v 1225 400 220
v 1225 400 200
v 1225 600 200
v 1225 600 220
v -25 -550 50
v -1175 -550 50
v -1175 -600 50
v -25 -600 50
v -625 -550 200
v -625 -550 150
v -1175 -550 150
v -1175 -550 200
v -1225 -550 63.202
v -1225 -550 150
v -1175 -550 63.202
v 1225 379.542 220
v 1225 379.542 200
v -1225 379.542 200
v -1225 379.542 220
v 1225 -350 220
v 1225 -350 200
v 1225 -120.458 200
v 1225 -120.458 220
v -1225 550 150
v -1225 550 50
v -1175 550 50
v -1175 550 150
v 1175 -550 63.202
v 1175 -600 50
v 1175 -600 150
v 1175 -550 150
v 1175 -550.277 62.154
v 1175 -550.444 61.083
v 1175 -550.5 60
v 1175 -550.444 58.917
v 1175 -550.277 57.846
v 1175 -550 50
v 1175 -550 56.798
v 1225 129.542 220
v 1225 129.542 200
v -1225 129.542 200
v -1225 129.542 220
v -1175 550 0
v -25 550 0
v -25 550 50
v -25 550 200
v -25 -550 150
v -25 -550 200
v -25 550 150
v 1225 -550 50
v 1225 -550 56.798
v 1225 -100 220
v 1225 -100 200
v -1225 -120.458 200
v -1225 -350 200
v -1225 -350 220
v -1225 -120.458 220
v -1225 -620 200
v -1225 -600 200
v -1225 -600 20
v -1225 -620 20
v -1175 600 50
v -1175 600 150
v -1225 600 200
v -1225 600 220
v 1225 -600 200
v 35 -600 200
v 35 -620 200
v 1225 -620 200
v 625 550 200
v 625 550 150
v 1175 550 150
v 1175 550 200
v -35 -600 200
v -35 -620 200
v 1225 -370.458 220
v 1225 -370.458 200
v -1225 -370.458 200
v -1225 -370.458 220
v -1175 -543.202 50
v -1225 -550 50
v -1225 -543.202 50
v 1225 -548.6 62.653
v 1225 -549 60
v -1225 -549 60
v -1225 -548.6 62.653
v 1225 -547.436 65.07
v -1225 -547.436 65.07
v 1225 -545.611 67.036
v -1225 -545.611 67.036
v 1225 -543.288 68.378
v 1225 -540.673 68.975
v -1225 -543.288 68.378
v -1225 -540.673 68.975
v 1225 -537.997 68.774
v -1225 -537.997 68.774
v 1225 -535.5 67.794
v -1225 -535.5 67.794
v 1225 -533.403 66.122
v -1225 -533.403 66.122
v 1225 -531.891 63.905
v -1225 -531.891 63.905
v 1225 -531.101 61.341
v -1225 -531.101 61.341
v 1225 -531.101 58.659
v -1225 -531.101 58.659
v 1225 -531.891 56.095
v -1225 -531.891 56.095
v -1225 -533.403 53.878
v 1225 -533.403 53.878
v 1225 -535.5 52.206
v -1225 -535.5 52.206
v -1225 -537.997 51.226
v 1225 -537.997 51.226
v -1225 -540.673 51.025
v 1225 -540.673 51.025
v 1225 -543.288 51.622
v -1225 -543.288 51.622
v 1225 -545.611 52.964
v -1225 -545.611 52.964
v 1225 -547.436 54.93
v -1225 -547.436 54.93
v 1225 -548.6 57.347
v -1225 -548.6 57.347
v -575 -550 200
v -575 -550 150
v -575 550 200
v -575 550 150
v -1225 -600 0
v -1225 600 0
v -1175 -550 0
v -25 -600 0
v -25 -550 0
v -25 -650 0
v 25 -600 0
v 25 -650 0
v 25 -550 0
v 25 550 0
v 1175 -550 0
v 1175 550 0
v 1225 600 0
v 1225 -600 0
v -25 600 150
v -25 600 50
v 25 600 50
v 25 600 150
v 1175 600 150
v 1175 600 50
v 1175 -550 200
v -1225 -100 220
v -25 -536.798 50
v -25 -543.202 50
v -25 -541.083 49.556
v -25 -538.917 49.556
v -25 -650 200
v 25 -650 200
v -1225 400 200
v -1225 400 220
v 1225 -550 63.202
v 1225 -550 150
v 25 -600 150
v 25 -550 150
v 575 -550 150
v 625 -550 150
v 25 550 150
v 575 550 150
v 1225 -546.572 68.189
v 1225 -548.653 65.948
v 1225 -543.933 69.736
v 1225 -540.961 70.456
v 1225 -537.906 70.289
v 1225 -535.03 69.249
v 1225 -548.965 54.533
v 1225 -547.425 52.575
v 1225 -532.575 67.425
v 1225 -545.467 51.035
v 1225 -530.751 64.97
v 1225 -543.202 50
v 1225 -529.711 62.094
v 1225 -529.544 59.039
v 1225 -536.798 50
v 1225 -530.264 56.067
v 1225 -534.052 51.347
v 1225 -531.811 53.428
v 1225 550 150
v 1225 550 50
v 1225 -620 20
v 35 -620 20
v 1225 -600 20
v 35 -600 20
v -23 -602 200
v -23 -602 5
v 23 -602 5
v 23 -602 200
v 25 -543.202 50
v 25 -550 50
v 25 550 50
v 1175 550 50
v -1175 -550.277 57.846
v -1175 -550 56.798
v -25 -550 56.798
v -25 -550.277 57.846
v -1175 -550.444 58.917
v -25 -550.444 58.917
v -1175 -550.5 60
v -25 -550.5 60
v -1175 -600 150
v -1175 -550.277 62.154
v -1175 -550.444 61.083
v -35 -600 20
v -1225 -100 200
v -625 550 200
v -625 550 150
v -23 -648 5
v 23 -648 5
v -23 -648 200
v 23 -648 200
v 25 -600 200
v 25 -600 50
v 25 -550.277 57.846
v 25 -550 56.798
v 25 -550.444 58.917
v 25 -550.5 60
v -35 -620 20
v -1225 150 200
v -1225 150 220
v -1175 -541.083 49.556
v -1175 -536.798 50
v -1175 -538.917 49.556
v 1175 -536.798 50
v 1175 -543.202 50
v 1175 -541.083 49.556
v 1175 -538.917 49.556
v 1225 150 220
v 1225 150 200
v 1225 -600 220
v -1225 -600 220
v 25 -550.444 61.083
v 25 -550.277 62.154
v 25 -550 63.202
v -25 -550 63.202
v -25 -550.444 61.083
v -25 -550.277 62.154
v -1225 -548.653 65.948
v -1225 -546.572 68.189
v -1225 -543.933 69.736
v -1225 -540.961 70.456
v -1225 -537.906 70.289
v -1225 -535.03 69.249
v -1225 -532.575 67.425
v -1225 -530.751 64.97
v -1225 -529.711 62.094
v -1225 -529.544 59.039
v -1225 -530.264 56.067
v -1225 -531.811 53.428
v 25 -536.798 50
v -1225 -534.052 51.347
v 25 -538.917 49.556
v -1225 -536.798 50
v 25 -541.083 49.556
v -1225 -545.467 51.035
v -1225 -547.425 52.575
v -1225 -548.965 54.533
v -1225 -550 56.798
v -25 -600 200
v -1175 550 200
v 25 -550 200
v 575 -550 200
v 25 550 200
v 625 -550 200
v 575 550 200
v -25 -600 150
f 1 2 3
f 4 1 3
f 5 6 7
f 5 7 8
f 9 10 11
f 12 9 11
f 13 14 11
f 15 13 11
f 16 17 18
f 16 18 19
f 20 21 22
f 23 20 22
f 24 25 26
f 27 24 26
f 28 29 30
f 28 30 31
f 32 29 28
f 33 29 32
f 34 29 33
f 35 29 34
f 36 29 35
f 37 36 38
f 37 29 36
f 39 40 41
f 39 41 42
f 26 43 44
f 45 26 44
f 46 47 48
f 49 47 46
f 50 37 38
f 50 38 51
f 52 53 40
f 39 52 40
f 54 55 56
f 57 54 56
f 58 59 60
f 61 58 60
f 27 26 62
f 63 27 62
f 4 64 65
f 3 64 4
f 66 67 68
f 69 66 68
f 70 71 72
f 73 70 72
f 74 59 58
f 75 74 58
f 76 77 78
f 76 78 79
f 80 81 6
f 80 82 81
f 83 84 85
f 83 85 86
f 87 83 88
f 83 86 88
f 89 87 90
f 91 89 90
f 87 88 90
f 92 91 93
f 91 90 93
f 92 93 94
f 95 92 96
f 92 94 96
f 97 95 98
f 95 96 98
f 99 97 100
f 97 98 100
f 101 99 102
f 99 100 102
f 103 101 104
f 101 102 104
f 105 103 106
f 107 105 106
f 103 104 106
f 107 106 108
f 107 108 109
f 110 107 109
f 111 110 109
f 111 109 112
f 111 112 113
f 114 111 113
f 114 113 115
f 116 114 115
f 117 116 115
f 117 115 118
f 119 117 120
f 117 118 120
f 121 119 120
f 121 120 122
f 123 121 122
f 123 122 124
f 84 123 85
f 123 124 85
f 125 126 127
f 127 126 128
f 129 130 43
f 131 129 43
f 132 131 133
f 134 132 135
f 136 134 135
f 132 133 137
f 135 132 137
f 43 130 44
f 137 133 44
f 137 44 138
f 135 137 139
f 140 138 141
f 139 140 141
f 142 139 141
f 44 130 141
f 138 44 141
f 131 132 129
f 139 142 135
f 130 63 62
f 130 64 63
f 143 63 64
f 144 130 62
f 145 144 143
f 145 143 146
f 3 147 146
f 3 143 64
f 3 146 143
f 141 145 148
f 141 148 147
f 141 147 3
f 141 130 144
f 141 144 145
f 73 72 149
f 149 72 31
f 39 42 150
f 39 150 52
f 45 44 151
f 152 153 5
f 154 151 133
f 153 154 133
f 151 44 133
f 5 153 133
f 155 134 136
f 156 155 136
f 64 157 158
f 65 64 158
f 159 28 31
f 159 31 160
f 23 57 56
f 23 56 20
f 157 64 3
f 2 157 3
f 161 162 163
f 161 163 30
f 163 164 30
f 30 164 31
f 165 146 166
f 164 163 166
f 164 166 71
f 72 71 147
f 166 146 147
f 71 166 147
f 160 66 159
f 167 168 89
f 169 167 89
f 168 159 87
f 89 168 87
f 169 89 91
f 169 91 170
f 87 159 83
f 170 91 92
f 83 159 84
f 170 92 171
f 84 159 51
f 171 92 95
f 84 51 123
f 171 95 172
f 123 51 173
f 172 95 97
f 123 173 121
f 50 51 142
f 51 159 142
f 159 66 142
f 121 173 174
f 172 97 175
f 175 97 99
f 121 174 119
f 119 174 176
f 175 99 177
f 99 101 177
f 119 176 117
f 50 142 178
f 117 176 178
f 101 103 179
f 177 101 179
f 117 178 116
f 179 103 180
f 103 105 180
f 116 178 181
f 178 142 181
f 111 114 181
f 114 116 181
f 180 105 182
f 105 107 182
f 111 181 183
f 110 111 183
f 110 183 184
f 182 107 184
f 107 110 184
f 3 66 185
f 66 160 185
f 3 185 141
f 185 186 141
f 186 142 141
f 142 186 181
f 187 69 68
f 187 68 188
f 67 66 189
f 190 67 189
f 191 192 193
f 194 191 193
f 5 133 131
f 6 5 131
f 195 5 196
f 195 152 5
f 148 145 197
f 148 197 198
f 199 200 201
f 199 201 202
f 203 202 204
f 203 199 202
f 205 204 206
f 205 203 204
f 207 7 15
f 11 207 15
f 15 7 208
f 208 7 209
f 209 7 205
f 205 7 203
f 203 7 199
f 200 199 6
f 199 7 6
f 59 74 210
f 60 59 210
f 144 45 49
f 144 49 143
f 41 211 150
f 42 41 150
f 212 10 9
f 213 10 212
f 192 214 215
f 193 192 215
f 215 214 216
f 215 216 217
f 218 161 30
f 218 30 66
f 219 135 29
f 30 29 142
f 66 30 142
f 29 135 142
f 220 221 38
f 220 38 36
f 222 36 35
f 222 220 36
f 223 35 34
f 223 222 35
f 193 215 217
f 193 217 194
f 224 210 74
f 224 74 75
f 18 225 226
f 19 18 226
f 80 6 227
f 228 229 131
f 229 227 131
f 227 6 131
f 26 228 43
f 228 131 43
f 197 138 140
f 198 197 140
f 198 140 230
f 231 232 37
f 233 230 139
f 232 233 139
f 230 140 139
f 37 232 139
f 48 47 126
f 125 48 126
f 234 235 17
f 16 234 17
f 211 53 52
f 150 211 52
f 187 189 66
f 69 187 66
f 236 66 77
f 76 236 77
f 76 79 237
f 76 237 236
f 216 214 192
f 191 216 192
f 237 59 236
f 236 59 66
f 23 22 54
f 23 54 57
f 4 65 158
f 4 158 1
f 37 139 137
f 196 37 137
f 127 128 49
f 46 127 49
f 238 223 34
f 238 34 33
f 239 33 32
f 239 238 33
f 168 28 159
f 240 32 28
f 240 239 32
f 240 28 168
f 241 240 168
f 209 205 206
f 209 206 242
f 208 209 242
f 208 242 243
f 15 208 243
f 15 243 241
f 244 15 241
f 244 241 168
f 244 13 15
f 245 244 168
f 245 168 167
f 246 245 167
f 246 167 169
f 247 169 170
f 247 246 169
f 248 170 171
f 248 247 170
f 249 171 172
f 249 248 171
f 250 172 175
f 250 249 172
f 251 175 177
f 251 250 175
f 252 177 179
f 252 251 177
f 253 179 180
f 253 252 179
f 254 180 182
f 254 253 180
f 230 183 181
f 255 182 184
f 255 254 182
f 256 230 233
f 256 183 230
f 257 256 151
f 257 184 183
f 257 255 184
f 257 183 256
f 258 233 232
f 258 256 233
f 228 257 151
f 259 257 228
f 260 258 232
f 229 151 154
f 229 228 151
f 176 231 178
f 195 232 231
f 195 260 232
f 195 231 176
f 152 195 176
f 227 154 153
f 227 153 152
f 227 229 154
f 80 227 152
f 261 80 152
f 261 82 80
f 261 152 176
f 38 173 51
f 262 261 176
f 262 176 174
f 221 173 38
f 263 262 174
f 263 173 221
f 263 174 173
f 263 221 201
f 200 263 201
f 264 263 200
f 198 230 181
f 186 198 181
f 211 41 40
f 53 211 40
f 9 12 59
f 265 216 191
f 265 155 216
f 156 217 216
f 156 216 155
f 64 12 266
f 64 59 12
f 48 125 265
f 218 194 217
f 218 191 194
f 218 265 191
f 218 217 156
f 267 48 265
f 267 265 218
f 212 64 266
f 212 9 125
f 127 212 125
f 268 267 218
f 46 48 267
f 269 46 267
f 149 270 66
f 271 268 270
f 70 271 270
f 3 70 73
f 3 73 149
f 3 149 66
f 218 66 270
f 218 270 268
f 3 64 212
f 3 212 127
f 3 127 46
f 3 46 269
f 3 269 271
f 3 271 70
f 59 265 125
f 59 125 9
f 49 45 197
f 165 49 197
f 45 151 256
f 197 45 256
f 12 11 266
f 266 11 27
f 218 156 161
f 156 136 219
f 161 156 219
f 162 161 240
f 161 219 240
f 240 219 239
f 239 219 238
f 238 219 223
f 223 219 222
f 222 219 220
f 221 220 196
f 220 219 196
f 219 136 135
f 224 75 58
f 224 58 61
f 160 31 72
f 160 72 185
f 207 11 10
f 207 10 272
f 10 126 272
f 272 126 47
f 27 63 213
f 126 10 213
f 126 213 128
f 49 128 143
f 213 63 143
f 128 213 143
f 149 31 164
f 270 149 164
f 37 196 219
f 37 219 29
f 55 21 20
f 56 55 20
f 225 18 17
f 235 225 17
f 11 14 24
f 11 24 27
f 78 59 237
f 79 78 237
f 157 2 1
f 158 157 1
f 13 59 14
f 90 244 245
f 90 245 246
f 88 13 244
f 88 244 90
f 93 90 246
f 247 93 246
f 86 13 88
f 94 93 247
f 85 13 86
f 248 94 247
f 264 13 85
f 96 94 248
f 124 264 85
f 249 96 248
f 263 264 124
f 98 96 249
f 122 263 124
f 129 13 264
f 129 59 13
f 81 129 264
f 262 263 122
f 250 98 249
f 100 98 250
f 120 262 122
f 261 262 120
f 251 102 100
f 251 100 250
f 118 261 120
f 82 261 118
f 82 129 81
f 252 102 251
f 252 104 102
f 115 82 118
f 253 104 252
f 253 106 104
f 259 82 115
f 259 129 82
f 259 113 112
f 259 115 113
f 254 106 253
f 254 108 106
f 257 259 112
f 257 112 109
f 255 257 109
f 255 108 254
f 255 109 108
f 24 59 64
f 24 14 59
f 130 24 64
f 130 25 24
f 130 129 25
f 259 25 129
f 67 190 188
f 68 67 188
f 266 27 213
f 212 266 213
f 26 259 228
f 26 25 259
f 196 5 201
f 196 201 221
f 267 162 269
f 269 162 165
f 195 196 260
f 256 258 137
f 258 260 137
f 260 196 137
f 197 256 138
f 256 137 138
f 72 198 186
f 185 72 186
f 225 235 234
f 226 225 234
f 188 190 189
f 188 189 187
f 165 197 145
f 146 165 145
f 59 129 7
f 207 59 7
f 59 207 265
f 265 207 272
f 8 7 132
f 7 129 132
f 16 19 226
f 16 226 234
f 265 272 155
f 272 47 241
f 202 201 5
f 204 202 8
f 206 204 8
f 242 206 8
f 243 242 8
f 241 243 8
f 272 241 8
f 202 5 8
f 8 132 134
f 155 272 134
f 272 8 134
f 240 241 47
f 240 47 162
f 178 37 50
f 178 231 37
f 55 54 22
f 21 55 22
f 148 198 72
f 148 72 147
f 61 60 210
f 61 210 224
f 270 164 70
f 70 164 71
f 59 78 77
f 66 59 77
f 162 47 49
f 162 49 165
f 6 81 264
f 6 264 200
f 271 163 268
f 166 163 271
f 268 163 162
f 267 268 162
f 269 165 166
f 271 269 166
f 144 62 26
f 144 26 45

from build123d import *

# Parameters (mm, degrees)
F0_W      = 50
F0_H      = 50
F0_H_2    = 1100
F1_DEPTH  = 50
F2_W      = 50
F2_H      = 50
F3_DEPTH  = 100
F4_W      = 2450
F4_H      = 1200
F4_W_2    = 25
F4_H_2    = 1100
F4_W_3    = 50
F5_DEPTH  = 50
F6_R      = 9
F7_DEPTH  = 2450
F9_DEPTH  = 20
F10_W     = 2500
F10_H     = 1200
F11_DEPTH = 20
F12_DEPTH = 110
F13_W     = 20.458304882
F13_H     = 20
F14_DEPTH = 2500
F15_DEPTH = 60
F17_W     = 50
F17_H     = 20
F18_DEPTH = 1200.001
F19_W     = 50
F19_H     = 50
F19_W_2   = 10
F20_DEPTH = 200
F21_W     = 50
F21_H     = 50
F22_DEPTH = 5
F23_W     = 46
F23_H     = 46
F23_W_2   = 2
F23_H_2   = 2
F24_DEPTH = 195


with BuildPart() as f1:
    # F0 (on Top) → F1 (new body)
    with BuildSketch(Plane.XY):
        with Locations((1200, -575)):
            Rectangle(F0_W, F0_H)
        Polygon((-1175, -600), (1175, -600), (1175, -550), (25, -550), (0, -550), (-25, -550), (-1175, -550), align=None)
        with Locations((1200, 0)):
            Rectangle(F0_W, F0_H_2)
        with Locations((-1200, -575)):
            Rectangle(F0_W, F0_H)
        with Locations((1200, 575)):
            Rectangle(F0_W, F0_H)
        with Locations((-1200, 0)):
            Rectangle(F0_W, F0_H_2)
        Polygon((25, 550), (1175, 550), (1175, 600), (-1175, 600), (-1175, 550), (-25, 550), (0, 550), align=None)
        with Locations((-1200, 575)):
            Rectangle(F0_W, F0_H)
        Polygon((0, -550), (25, -550), (25, 0), (25, 550), (0, 550), (0, 0), align=None)
        Polygon((-25, 0), (-25, -550), (0, -550), (0, 0), (0, 550), (-25, 550), align=None)
    extrude(amount=F1_DEPTH)

    # F2 (on face) → F3 (join)
    with BuildSketch(Plane.XY.offset(50)):
        with Locations((0, 575)):
            Rectangle(F2_W, F2_H)
        with Locations((-1200, 575)):
            Rectangle(F2_W, F2_H)
        with Locations((-1200, -575)):
            Rectangle(F2_W, F2_H)
        with Locations((0, -575)):
            Rectangle(F2_W, F2_H)
        with Locations((1200, -575)):
            Rectangle(F2_W, F2_H)
        with Locations((1200, 575)):
            Rectangle(F2_W, F2_H)
    extrude(amount=F3_DEPTH)

    # F4 (on face) → F5 (join)
    with BuildSketch(Plane.XY.offset(150)):
        Rectangle(F4_W, F4_H)
        Polygon((1175, 550), (1175, -550), (625, -550), (600, -550), (575, -550), (25, -550), (-25, -550), (-575, -550), (-600, -550), (-625, -550), (-1175, -550), (-1175, 550), (-625, 550), (-600, 550), (-575, 550), (-25, 550), (25, 550), (575, 550), (600, 550), (625, 550), align=None, mode=Mode.SUBTRACT)
        with Locations((-587.5, 0)):
            Rectangle(F4_W_2, F4_H_2)
        with Locations((-612.5, 0)):
            Rectangle(F4_W_2, F4_H_2)
        with Locations((612.5, 0)):
            Rectangle(F4_W_2, F4_H_2)
        with Locations((587.5, 0)):
            Rectangle(F4_W_2, F4_H_2)
        Rectangle(F4_W_3, F4_H_2)
    extrude(amount=F5_DEPTH)

    # F6 (on face) → F7 (join)
    with BuildSketch(Plane(origin=(-1225, 0, 0), x_dir=(0, -1, 0), z_dir=(-1, 0, 0))):
        with BuildLine():
            ThreePointArc((550.5, 60), (529.6257530394, 61.6201851746), (550, 56.7984378813))
            ThreePointArc((550, 56.7984378813), (550.3742469606, 58.3798148254), (550.5, 60))
        make_face()
        with Locations((540, 60)):
            Circle(F6_R, mode=Mode.SUBTRACT)
    extrude(amount=-F7_DEPTH)

    # F21 (on face) → F22 (join)
    with BuildSketch(Plane(origin=(0, 0, 0), x_dir=(1, 0, 0), z_dir=(0, 0, -1))):
        with Locations((0, 625)):
            Rectangle(F21_W, F21_H)
    extrude(amount=-F22_DEPTH)

    # F23 (on face) → F24 (join, through all)
    with BuildSketch(Plane.XY.offset(5)):
        Polygon((25, -600), (-25, -600), (-25, -650), (23, -650), (23, -648), (25, -648), align=None)
        with Locations((0, -625)):
            Rectangle(F23_W, F23_H, mode=Mode.SUBTRACT)
        with Locations((24, -649)):
            Rectangle(F23_W_2, F23_H_2)
    extrude(amount=F24_DEPTH)


with BuildPart() as f9:
    # F8 (on face) → F9 (new body)
    with BuildSketch(Plane.XZ.offset(600)):
        Polygon((1225, 20), (1225, 200), (-1225, 200), (-1275, 200), (-1275, 20), align=None)
    extrude(amount=F9_DEPTH)

    # F12 (cut): a face of the model
    f12_faces = [f9.faces().sort_by_distance(p)[0] for p in [
        (-1275, -610, 110),
    ]]
    extrude(f12_faces, amount=-F12_DEPTH, mode=Mode.SUBTRACT)


with BuildPart() as f11:
    # F10 (on face) → F11 (new body)
    with BuildSketch(Plane.XY.offset(200)):
        with Locations((-25, 0)):
            Rectangle(F10_W, F10_H)
    extrude(amount=F11_DEPTH)

    # F13 (on face) → F14 (cut, through all)
    with BuildSketch(Plane(origin=(-1275, 0, 0), x_dir=(0, -1, 0), z_dir=(-1, 0, 0))):
        with Locations((610.229152441, 210)):
            Rectangle(F13_W, F13_H)
        with Locations((360.229152441, 210)):
            Rectangle(F13_W, F13_H)
        with Locations((110.229152441, 210)):
            Rectangle(F13_W, F13_H)
        with Locations((-139.770847559, 210)):
            Rectangle(F13_W, F13_H)
        with Locations((-389.770847559, 210)):
            Rectangle(F13_W, F13_H)
    extrude(amount=-F14_DEPTH, mode=Mode.SUBTRACT)

    # F17 (on face) → F18 (cut, through all)
    with BuildSketch(Plane.XZ.offset(600)):
        with Locations((-1250, 210)):
            Rectangle(F17_W, F17_H)
    extrude(amount=-F18_DEPTH, mode=Mode.SUBTRACT)


with BuildPart() as f15:
    # F15 (new, through all): a face of the model
    f15_faces = [f9.part.faces().sort_by_distance(p)[0] for p in [
        (-1165, -610, 110),
    ]]
    extrude(f15_faces, amount=F15_DEPTH)


with BuildPart() as f9_1:
    add(f9.part)

    # F16: union F15
    add(f15.part)

    # F19 (on face) → F20 (cut, through all)
    with BuildSketch(Plane(origin=(0, 0, 0), x_dir=(1, 0, 0), z_dir=(0, 0, -1))):
        with Locations((0, 625)):
            Rectangle(F19_W, F19_H)
        with Locations((-30, 625)):
            Rectangle(F19_W_2, F19_H)
        with Locations((30, 625)):
            Rectangle(F19_W_2, F19_H)
    extrude(amount=-F20_DEPTH, mode=Mode.SUBTRACT)


solid = Compound([f1.part, f11.part, f9_1.part])
